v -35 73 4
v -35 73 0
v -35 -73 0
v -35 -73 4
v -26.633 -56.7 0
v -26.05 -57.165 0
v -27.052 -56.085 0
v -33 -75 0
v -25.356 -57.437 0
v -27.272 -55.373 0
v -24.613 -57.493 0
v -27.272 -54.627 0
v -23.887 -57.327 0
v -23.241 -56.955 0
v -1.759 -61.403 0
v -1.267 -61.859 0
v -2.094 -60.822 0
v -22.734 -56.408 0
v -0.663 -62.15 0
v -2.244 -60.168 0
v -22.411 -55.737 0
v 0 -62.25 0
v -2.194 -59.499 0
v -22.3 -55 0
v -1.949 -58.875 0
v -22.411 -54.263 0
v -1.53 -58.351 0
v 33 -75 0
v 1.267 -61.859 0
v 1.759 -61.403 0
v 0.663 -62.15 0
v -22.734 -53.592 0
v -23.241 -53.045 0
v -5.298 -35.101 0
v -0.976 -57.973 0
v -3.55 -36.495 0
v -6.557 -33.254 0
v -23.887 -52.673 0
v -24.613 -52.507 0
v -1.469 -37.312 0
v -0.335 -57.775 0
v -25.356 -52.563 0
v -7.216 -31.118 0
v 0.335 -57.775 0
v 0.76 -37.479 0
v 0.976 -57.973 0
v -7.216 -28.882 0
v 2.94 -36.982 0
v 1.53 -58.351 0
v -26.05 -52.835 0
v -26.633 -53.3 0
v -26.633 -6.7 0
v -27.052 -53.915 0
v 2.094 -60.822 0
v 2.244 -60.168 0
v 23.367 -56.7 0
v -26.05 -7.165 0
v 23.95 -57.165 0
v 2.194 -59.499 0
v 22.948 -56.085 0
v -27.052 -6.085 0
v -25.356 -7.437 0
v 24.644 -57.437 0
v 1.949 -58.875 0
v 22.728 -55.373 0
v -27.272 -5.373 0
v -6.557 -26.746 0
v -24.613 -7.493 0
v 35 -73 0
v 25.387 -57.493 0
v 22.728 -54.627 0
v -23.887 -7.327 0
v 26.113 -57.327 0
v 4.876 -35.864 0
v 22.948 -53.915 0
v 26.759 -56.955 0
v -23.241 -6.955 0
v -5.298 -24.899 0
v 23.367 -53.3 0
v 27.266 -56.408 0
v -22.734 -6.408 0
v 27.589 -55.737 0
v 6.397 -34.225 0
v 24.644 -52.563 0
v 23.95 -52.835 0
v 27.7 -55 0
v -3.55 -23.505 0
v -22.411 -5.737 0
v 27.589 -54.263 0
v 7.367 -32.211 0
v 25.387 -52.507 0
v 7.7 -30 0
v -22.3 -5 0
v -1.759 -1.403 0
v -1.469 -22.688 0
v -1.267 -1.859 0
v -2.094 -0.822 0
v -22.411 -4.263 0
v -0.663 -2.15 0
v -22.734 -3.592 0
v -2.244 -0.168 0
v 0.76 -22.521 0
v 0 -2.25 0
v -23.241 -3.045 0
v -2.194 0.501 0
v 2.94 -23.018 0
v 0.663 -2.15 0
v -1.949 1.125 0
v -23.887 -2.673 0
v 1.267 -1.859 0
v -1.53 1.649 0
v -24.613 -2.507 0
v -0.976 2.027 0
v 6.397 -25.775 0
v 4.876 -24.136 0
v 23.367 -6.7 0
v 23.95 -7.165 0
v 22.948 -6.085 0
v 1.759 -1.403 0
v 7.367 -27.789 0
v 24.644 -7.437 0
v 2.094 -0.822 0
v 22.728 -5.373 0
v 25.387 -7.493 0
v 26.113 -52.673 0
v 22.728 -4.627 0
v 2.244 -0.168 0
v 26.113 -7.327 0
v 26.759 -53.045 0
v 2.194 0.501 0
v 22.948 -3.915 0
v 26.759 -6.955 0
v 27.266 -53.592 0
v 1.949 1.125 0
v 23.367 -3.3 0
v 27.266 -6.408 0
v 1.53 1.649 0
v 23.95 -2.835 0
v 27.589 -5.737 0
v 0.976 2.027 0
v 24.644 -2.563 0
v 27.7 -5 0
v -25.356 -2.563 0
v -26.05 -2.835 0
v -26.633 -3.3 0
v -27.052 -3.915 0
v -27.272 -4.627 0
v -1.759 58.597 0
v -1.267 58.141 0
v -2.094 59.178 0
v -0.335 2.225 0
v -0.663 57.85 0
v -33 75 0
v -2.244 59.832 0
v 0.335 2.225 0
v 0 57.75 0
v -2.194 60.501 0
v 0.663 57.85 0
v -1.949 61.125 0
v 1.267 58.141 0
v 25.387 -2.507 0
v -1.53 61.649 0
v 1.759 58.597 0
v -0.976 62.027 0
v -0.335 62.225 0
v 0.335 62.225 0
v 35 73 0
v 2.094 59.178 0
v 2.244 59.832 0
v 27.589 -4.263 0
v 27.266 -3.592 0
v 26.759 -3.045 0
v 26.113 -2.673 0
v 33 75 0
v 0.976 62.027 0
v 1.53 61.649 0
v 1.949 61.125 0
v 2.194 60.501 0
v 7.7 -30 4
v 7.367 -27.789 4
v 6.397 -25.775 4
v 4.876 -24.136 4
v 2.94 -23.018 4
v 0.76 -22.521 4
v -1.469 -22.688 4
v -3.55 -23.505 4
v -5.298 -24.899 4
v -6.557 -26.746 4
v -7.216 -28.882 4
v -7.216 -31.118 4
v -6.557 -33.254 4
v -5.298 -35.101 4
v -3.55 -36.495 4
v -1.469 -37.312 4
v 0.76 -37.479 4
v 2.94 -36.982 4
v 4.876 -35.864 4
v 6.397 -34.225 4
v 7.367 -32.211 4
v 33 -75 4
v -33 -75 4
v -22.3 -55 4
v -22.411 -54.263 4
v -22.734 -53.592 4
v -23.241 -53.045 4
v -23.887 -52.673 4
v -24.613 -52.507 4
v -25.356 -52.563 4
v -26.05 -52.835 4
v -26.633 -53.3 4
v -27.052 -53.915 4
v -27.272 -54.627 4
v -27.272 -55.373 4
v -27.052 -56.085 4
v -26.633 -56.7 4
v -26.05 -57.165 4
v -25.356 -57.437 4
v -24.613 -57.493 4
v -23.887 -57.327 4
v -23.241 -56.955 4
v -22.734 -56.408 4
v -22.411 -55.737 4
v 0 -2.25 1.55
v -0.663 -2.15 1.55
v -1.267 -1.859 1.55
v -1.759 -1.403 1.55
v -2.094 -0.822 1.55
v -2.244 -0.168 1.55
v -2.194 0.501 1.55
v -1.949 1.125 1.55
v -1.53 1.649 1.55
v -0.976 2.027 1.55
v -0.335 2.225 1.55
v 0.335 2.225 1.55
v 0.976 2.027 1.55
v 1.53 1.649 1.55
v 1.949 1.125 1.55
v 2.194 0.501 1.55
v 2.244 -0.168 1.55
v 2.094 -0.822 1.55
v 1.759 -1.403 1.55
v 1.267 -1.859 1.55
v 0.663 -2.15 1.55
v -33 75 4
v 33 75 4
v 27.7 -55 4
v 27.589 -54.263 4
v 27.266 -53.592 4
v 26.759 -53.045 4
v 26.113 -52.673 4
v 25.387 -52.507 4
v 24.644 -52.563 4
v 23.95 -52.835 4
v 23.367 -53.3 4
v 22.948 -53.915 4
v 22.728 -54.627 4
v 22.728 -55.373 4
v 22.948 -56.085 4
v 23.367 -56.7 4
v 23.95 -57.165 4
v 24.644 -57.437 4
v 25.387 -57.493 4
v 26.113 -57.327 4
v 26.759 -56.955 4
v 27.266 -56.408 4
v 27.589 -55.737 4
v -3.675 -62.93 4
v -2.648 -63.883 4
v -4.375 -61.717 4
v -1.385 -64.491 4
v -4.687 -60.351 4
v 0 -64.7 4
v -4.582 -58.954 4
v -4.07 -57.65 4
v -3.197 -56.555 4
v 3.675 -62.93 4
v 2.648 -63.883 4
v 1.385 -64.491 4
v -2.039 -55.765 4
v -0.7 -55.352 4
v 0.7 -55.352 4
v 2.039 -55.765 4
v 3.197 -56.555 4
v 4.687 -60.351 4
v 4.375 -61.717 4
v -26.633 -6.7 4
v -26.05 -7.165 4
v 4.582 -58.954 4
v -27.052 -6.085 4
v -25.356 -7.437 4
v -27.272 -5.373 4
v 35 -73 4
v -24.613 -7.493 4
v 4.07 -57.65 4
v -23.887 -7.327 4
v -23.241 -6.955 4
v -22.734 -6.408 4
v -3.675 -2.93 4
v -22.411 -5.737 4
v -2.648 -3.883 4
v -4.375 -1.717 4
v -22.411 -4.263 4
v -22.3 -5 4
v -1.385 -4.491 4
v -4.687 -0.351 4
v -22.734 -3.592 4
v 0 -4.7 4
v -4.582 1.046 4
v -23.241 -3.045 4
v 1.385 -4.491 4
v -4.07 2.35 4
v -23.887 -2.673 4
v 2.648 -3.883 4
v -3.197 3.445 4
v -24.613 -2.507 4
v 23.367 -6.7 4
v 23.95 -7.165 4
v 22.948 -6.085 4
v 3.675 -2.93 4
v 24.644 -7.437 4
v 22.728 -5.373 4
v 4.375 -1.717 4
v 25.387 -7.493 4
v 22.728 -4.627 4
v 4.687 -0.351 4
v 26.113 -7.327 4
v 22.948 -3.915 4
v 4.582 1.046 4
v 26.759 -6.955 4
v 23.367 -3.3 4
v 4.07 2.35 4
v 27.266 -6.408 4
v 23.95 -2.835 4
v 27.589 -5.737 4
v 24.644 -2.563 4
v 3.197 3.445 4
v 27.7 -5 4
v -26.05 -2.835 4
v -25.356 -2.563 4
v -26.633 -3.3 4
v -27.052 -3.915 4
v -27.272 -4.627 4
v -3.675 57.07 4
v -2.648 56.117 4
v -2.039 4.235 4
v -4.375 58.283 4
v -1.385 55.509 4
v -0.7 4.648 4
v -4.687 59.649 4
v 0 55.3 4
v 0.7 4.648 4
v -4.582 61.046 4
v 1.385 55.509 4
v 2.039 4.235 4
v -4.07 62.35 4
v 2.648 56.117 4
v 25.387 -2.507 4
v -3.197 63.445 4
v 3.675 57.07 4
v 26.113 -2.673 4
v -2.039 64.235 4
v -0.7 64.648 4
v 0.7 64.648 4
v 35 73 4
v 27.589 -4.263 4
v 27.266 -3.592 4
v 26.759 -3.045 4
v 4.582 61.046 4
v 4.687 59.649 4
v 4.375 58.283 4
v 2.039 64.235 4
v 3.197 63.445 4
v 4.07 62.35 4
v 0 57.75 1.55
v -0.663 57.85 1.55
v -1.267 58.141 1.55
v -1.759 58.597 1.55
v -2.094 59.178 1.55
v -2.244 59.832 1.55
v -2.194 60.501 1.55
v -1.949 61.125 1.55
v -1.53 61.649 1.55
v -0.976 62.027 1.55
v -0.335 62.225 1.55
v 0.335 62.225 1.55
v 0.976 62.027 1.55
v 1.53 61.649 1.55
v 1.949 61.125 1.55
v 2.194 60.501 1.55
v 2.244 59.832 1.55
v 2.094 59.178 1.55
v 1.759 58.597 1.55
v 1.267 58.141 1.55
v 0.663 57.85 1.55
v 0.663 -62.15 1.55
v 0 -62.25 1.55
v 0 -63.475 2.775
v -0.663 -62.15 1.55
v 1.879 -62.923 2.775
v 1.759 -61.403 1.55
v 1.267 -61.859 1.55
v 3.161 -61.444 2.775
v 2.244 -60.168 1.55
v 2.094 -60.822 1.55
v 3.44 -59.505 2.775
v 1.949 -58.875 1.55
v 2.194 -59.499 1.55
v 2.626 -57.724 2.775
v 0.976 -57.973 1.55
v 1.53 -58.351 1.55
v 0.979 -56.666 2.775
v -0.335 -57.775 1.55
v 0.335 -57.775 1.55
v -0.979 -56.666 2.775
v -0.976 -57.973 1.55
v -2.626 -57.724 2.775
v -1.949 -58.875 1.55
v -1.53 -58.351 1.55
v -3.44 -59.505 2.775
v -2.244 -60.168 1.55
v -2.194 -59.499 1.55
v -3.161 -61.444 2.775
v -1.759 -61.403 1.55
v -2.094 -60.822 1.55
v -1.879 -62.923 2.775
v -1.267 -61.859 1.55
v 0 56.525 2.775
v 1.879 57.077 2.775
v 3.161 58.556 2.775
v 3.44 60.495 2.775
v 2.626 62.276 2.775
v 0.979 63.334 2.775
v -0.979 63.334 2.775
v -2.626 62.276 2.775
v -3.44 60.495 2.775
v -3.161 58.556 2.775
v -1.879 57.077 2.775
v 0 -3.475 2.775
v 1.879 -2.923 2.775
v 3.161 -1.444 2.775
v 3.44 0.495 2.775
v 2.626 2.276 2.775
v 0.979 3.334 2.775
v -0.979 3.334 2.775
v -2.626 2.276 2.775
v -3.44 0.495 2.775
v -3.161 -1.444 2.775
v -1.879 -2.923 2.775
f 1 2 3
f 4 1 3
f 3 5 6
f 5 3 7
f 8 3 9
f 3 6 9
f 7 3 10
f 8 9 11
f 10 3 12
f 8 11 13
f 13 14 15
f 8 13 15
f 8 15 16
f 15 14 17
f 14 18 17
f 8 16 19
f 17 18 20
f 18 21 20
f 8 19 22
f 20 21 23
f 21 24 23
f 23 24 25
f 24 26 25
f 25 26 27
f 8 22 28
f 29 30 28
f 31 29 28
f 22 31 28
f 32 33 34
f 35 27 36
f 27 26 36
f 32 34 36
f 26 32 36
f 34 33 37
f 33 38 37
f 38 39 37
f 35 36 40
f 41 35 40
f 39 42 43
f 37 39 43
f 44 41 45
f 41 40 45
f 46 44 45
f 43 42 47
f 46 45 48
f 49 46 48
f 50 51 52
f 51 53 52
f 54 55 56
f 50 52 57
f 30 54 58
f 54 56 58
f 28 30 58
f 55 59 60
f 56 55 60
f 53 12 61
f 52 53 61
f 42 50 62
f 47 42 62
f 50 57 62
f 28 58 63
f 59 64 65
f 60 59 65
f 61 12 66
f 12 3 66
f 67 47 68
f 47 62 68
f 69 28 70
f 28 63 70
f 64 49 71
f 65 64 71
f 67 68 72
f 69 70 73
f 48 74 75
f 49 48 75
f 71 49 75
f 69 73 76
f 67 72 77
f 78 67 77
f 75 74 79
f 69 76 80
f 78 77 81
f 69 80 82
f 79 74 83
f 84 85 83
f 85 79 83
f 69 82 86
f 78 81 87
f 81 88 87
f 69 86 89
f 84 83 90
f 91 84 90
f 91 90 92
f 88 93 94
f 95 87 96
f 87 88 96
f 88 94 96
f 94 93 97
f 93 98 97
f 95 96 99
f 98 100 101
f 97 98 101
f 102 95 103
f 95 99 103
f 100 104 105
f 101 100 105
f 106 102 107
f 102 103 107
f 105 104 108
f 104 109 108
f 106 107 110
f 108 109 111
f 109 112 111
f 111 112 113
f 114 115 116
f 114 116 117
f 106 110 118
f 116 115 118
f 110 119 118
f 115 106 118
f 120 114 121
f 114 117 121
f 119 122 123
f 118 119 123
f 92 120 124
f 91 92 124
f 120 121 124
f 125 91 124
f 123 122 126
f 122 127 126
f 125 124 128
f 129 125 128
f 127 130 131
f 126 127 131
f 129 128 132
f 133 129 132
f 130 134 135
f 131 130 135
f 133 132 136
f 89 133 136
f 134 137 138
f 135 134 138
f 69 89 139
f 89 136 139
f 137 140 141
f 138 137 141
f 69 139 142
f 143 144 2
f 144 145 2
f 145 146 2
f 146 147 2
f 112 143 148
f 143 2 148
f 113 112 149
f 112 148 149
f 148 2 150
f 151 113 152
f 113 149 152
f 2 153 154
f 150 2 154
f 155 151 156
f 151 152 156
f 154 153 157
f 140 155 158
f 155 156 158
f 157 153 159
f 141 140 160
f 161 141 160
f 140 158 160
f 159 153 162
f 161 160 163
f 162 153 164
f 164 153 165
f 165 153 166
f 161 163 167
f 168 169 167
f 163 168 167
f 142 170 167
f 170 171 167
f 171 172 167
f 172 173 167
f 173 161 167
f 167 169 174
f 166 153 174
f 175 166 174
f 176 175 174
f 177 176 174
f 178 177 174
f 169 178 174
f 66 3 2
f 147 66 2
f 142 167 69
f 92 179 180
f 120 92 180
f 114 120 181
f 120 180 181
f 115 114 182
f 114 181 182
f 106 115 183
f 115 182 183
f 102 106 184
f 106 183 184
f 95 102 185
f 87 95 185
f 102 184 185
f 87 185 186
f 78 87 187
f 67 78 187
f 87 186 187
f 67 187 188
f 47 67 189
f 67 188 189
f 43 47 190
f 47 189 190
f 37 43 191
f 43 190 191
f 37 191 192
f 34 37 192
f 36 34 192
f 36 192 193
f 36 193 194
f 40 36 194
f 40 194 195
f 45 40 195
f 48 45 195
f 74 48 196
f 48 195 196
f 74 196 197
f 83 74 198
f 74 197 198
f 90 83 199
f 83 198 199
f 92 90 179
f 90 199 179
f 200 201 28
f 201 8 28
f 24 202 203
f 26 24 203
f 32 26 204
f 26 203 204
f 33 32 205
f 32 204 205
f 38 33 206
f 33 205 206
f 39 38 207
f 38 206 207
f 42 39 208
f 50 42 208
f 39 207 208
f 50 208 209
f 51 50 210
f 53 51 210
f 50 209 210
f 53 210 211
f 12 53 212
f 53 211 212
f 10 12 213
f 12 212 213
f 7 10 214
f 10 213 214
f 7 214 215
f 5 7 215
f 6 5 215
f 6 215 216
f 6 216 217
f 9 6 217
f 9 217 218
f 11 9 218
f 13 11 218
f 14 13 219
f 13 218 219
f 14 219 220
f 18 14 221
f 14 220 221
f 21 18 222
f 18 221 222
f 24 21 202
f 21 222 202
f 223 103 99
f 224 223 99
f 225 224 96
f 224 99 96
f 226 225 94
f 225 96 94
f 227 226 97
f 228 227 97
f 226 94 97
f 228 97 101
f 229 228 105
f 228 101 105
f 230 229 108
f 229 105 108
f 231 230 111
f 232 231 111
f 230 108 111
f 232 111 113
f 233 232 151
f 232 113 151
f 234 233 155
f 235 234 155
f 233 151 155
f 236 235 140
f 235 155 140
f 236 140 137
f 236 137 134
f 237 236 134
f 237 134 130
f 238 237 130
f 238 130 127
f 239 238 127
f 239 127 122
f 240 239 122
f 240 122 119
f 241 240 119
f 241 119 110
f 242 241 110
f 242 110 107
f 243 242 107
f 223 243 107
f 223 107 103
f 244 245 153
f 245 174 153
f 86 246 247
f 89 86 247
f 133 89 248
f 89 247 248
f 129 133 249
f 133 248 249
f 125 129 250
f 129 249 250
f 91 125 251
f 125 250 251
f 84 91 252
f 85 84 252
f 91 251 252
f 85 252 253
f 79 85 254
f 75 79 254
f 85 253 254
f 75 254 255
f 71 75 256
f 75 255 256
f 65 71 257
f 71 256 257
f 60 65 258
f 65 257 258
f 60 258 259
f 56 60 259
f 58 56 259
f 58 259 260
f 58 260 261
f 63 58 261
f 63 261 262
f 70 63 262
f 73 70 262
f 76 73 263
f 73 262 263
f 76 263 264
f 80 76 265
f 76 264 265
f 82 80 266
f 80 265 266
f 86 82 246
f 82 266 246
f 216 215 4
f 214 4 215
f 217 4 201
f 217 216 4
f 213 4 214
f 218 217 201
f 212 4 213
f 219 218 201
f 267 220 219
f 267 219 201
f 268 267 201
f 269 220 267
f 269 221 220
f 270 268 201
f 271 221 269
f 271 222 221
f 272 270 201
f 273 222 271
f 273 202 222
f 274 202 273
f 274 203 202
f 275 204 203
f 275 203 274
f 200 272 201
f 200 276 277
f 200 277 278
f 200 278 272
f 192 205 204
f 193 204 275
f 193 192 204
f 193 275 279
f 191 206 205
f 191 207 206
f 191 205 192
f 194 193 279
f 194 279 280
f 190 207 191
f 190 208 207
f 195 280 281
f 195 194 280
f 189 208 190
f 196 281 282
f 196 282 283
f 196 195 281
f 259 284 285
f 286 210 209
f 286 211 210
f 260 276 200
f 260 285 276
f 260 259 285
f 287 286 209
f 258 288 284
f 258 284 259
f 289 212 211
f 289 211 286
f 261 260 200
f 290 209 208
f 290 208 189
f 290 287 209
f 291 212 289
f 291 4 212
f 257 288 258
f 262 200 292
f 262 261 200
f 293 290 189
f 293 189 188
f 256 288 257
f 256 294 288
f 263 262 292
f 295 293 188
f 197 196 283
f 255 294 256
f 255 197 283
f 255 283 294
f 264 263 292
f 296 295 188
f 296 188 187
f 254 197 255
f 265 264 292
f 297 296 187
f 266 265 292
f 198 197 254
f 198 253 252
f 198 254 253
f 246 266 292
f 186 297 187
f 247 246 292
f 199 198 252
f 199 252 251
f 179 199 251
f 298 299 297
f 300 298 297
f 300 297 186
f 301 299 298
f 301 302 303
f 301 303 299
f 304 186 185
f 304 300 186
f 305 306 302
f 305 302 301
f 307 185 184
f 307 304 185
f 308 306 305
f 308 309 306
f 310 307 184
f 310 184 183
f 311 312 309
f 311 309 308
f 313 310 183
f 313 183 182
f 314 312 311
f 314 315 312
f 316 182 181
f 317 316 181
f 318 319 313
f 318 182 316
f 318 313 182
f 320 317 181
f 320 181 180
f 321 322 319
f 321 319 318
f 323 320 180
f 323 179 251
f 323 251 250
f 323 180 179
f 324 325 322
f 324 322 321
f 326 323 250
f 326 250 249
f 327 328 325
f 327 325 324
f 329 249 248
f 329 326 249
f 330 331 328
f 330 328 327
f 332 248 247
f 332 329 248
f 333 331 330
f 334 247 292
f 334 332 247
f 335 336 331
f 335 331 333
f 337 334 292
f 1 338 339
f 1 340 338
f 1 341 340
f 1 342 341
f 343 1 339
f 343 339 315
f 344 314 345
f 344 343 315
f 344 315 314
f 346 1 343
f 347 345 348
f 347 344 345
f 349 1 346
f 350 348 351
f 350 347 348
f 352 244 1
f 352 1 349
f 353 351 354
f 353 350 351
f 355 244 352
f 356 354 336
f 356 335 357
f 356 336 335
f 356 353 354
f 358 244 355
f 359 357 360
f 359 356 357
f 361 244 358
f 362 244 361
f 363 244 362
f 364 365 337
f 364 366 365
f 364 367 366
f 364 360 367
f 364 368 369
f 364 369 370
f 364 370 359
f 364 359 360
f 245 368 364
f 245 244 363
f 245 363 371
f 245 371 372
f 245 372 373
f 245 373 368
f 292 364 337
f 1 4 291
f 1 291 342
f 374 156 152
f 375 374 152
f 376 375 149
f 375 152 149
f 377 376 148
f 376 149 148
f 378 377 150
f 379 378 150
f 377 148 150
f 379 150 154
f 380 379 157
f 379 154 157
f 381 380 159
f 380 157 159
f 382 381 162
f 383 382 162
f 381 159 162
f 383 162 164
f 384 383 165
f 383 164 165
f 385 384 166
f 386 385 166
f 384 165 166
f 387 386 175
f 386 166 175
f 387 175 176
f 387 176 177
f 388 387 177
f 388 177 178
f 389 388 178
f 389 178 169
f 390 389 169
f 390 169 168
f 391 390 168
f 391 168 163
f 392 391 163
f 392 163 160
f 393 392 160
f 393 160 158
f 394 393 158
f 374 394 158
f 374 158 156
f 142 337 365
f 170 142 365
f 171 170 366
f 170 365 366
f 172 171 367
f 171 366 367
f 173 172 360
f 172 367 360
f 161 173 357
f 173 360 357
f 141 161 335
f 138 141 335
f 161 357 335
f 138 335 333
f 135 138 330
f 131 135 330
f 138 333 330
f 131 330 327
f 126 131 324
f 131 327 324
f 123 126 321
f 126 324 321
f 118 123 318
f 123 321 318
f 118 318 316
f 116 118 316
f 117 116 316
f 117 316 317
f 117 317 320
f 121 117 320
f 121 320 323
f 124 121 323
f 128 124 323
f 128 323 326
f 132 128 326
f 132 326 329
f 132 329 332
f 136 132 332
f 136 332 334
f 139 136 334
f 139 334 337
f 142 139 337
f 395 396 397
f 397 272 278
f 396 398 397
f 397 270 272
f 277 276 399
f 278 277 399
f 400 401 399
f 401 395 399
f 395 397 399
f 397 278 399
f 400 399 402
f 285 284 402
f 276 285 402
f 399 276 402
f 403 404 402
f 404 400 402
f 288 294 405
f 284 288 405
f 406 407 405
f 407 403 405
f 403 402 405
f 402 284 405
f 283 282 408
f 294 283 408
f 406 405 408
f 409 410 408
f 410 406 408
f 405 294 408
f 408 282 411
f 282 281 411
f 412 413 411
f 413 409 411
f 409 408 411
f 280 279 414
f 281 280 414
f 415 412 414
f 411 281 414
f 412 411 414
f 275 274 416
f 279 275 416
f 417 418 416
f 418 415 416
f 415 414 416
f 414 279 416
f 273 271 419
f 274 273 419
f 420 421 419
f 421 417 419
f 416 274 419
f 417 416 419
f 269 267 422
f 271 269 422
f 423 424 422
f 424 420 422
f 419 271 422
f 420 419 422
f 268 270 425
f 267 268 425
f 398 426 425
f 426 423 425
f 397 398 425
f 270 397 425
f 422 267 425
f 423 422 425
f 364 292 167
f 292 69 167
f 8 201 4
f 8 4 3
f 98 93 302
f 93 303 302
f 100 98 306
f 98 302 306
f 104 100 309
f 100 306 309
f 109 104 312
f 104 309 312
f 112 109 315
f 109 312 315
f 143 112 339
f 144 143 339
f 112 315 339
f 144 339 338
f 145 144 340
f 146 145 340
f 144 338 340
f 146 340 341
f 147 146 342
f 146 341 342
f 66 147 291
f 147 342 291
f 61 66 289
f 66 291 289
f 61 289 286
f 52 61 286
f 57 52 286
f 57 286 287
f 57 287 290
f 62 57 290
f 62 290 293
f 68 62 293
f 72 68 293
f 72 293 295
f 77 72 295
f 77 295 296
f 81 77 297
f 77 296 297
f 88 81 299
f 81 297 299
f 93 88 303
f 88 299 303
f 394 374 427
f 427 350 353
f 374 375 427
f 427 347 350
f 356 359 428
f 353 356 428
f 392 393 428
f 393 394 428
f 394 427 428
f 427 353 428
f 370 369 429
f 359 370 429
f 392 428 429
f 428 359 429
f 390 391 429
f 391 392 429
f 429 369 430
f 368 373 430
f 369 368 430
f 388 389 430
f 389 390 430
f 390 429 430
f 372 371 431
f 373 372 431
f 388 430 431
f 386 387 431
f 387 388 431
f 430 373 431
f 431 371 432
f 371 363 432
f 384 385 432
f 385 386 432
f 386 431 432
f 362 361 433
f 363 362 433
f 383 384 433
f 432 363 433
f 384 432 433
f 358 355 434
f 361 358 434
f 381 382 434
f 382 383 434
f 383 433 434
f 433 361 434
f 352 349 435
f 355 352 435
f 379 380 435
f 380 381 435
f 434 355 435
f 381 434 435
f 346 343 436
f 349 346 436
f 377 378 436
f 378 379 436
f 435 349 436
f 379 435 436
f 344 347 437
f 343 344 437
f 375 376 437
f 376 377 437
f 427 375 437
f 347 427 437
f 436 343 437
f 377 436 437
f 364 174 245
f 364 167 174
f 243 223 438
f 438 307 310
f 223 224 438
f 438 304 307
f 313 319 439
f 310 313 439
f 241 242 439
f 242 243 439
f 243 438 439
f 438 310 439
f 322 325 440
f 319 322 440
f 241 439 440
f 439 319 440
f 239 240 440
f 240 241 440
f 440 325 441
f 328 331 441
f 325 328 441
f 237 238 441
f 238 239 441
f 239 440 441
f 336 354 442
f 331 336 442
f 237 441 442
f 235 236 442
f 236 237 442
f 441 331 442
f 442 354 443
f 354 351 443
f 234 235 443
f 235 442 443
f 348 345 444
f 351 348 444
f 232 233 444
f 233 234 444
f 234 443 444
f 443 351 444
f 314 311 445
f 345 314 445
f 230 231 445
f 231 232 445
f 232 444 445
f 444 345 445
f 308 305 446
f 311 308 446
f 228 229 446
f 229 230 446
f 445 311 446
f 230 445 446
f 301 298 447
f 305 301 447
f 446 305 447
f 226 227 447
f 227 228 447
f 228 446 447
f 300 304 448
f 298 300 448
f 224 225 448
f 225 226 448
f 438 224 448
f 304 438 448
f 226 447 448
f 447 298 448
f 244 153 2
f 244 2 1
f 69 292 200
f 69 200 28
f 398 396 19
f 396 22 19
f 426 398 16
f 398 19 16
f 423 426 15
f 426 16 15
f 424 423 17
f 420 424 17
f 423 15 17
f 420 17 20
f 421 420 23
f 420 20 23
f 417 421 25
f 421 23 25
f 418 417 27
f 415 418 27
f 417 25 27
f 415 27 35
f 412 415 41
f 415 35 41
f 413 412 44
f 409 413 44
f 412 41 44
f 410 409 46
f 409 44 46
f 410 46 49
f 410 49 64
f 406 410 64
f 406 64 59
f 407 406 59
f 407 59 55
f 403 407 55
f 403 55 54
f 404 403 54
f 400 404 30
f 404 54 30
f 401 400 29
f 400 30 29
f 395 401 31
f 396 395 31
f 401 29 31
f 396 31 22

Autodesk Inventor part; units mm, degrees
ref_plane "YZ Plane" through (0, 0, 0) normal (1, 0, 0) x (0, 1, 0)
ref_plane "XZ Plane" through (0, 0, 0) normal (0, 1, 0) x (-1, 0, 0)
ref_plane "XY Plane" through (0, 0, 0) normal (0, 0, 1) x (1, 0, 0)
sketch "Esboço1" plane through (0, 0, 0) normal (0, 0, 1) x (1, 0, 0)
  line L0 (-35, -75) -> (35, -75)
  line L1 (35, -75) -> (35, 75)
  line L2 (35, 75) -> (-35, 75)
  line L3 (-35, 75) -> (-35, -75)
  line L4 (-35, -75) -> (35, 75) construction
  line L5 (35, -75) -> (-35, 75) construction
  point P0 (0, 0)
  dimension "d0" = 150
  dimension "d1" = 70
extrude "Extrusão1" add sketch "Esboço1" along normal blind 4
sketch "Esboço2" plane through (0, 0, 4) normal (0, 0, 1) x (1, 0, 0)
  line L0 (35, 75) -> (-35, 75) projected
  line L1 (-35, -75) -> (35, -75) projected
  line L2 (-35, 75) -> (-35, -75) projected
  point P0 (0, 0)
  point P1 (0, 60)
  point P2 (0, -60)
  point P3 (0, 0)
  dimension "d4" = 15
  dimension "d5" = 15
  dimension "d6" = 35
  dimension "d7" = 35
hole "Furo1" at (0, 60, 4) at (0, -60, 4) at (0, 0, 4) direction (0, 0, -1) diameter 4.5 end through all countersink diameter 9.4 countersink angle 90 clearance for "Countersunk Flat Head Screw ISO 2009/7046" size "M4" standard "ISO"
chamfer "Chanfro1" distance 2 angle 45 4 edges at (35, -75, 2) (-35, -75, 2) (35, 75, 2) (-35, 75, 2)
sketch "Esboço3" plane through (0, 0, 4) normal (0, 0, 1) x (1, 0, 0)
  circle A0 centre (-24.8, -5) radius 3.8 construction
  circle A1 centre (-24.8, -55) radius 3.8 construction
  circle A2 centre (25.2, -5) radius 3.8 construction
  circle A3 centre (25.2, -55) radius 3.8 construction
  circle A4 centre (-24.8, -55) radius 2.5
  circle A5 centre (25.2, -55) radius 2.5
  circle A6 centre (25.2, -5) radius 2.5
  circle A7 centre (-24.8, -5) radius 2.5
  point P0 (0, 0)
  dimension "d18" = 5
  dimension "d19" = 0
extrude "Extrusão2" cut sketch "Esboço3" against normal blind 10
sketch "Esboço4" plane through (0, 0, 4) normal (0, 0, 1) x (1, 0, 0)
  circle A0 centre (0.2, -30) radius 5.5 projected
  circle A1 centre (0.2, -30) radius 7.5
  point P0 (0, 0)
  dimension "d24" = 15
extrude "Extrusão3" cut sketch "Esboço4" against normal through all contours A0 | A1
properties part number "Espaçador Bastidor" material "Poliacetal"
